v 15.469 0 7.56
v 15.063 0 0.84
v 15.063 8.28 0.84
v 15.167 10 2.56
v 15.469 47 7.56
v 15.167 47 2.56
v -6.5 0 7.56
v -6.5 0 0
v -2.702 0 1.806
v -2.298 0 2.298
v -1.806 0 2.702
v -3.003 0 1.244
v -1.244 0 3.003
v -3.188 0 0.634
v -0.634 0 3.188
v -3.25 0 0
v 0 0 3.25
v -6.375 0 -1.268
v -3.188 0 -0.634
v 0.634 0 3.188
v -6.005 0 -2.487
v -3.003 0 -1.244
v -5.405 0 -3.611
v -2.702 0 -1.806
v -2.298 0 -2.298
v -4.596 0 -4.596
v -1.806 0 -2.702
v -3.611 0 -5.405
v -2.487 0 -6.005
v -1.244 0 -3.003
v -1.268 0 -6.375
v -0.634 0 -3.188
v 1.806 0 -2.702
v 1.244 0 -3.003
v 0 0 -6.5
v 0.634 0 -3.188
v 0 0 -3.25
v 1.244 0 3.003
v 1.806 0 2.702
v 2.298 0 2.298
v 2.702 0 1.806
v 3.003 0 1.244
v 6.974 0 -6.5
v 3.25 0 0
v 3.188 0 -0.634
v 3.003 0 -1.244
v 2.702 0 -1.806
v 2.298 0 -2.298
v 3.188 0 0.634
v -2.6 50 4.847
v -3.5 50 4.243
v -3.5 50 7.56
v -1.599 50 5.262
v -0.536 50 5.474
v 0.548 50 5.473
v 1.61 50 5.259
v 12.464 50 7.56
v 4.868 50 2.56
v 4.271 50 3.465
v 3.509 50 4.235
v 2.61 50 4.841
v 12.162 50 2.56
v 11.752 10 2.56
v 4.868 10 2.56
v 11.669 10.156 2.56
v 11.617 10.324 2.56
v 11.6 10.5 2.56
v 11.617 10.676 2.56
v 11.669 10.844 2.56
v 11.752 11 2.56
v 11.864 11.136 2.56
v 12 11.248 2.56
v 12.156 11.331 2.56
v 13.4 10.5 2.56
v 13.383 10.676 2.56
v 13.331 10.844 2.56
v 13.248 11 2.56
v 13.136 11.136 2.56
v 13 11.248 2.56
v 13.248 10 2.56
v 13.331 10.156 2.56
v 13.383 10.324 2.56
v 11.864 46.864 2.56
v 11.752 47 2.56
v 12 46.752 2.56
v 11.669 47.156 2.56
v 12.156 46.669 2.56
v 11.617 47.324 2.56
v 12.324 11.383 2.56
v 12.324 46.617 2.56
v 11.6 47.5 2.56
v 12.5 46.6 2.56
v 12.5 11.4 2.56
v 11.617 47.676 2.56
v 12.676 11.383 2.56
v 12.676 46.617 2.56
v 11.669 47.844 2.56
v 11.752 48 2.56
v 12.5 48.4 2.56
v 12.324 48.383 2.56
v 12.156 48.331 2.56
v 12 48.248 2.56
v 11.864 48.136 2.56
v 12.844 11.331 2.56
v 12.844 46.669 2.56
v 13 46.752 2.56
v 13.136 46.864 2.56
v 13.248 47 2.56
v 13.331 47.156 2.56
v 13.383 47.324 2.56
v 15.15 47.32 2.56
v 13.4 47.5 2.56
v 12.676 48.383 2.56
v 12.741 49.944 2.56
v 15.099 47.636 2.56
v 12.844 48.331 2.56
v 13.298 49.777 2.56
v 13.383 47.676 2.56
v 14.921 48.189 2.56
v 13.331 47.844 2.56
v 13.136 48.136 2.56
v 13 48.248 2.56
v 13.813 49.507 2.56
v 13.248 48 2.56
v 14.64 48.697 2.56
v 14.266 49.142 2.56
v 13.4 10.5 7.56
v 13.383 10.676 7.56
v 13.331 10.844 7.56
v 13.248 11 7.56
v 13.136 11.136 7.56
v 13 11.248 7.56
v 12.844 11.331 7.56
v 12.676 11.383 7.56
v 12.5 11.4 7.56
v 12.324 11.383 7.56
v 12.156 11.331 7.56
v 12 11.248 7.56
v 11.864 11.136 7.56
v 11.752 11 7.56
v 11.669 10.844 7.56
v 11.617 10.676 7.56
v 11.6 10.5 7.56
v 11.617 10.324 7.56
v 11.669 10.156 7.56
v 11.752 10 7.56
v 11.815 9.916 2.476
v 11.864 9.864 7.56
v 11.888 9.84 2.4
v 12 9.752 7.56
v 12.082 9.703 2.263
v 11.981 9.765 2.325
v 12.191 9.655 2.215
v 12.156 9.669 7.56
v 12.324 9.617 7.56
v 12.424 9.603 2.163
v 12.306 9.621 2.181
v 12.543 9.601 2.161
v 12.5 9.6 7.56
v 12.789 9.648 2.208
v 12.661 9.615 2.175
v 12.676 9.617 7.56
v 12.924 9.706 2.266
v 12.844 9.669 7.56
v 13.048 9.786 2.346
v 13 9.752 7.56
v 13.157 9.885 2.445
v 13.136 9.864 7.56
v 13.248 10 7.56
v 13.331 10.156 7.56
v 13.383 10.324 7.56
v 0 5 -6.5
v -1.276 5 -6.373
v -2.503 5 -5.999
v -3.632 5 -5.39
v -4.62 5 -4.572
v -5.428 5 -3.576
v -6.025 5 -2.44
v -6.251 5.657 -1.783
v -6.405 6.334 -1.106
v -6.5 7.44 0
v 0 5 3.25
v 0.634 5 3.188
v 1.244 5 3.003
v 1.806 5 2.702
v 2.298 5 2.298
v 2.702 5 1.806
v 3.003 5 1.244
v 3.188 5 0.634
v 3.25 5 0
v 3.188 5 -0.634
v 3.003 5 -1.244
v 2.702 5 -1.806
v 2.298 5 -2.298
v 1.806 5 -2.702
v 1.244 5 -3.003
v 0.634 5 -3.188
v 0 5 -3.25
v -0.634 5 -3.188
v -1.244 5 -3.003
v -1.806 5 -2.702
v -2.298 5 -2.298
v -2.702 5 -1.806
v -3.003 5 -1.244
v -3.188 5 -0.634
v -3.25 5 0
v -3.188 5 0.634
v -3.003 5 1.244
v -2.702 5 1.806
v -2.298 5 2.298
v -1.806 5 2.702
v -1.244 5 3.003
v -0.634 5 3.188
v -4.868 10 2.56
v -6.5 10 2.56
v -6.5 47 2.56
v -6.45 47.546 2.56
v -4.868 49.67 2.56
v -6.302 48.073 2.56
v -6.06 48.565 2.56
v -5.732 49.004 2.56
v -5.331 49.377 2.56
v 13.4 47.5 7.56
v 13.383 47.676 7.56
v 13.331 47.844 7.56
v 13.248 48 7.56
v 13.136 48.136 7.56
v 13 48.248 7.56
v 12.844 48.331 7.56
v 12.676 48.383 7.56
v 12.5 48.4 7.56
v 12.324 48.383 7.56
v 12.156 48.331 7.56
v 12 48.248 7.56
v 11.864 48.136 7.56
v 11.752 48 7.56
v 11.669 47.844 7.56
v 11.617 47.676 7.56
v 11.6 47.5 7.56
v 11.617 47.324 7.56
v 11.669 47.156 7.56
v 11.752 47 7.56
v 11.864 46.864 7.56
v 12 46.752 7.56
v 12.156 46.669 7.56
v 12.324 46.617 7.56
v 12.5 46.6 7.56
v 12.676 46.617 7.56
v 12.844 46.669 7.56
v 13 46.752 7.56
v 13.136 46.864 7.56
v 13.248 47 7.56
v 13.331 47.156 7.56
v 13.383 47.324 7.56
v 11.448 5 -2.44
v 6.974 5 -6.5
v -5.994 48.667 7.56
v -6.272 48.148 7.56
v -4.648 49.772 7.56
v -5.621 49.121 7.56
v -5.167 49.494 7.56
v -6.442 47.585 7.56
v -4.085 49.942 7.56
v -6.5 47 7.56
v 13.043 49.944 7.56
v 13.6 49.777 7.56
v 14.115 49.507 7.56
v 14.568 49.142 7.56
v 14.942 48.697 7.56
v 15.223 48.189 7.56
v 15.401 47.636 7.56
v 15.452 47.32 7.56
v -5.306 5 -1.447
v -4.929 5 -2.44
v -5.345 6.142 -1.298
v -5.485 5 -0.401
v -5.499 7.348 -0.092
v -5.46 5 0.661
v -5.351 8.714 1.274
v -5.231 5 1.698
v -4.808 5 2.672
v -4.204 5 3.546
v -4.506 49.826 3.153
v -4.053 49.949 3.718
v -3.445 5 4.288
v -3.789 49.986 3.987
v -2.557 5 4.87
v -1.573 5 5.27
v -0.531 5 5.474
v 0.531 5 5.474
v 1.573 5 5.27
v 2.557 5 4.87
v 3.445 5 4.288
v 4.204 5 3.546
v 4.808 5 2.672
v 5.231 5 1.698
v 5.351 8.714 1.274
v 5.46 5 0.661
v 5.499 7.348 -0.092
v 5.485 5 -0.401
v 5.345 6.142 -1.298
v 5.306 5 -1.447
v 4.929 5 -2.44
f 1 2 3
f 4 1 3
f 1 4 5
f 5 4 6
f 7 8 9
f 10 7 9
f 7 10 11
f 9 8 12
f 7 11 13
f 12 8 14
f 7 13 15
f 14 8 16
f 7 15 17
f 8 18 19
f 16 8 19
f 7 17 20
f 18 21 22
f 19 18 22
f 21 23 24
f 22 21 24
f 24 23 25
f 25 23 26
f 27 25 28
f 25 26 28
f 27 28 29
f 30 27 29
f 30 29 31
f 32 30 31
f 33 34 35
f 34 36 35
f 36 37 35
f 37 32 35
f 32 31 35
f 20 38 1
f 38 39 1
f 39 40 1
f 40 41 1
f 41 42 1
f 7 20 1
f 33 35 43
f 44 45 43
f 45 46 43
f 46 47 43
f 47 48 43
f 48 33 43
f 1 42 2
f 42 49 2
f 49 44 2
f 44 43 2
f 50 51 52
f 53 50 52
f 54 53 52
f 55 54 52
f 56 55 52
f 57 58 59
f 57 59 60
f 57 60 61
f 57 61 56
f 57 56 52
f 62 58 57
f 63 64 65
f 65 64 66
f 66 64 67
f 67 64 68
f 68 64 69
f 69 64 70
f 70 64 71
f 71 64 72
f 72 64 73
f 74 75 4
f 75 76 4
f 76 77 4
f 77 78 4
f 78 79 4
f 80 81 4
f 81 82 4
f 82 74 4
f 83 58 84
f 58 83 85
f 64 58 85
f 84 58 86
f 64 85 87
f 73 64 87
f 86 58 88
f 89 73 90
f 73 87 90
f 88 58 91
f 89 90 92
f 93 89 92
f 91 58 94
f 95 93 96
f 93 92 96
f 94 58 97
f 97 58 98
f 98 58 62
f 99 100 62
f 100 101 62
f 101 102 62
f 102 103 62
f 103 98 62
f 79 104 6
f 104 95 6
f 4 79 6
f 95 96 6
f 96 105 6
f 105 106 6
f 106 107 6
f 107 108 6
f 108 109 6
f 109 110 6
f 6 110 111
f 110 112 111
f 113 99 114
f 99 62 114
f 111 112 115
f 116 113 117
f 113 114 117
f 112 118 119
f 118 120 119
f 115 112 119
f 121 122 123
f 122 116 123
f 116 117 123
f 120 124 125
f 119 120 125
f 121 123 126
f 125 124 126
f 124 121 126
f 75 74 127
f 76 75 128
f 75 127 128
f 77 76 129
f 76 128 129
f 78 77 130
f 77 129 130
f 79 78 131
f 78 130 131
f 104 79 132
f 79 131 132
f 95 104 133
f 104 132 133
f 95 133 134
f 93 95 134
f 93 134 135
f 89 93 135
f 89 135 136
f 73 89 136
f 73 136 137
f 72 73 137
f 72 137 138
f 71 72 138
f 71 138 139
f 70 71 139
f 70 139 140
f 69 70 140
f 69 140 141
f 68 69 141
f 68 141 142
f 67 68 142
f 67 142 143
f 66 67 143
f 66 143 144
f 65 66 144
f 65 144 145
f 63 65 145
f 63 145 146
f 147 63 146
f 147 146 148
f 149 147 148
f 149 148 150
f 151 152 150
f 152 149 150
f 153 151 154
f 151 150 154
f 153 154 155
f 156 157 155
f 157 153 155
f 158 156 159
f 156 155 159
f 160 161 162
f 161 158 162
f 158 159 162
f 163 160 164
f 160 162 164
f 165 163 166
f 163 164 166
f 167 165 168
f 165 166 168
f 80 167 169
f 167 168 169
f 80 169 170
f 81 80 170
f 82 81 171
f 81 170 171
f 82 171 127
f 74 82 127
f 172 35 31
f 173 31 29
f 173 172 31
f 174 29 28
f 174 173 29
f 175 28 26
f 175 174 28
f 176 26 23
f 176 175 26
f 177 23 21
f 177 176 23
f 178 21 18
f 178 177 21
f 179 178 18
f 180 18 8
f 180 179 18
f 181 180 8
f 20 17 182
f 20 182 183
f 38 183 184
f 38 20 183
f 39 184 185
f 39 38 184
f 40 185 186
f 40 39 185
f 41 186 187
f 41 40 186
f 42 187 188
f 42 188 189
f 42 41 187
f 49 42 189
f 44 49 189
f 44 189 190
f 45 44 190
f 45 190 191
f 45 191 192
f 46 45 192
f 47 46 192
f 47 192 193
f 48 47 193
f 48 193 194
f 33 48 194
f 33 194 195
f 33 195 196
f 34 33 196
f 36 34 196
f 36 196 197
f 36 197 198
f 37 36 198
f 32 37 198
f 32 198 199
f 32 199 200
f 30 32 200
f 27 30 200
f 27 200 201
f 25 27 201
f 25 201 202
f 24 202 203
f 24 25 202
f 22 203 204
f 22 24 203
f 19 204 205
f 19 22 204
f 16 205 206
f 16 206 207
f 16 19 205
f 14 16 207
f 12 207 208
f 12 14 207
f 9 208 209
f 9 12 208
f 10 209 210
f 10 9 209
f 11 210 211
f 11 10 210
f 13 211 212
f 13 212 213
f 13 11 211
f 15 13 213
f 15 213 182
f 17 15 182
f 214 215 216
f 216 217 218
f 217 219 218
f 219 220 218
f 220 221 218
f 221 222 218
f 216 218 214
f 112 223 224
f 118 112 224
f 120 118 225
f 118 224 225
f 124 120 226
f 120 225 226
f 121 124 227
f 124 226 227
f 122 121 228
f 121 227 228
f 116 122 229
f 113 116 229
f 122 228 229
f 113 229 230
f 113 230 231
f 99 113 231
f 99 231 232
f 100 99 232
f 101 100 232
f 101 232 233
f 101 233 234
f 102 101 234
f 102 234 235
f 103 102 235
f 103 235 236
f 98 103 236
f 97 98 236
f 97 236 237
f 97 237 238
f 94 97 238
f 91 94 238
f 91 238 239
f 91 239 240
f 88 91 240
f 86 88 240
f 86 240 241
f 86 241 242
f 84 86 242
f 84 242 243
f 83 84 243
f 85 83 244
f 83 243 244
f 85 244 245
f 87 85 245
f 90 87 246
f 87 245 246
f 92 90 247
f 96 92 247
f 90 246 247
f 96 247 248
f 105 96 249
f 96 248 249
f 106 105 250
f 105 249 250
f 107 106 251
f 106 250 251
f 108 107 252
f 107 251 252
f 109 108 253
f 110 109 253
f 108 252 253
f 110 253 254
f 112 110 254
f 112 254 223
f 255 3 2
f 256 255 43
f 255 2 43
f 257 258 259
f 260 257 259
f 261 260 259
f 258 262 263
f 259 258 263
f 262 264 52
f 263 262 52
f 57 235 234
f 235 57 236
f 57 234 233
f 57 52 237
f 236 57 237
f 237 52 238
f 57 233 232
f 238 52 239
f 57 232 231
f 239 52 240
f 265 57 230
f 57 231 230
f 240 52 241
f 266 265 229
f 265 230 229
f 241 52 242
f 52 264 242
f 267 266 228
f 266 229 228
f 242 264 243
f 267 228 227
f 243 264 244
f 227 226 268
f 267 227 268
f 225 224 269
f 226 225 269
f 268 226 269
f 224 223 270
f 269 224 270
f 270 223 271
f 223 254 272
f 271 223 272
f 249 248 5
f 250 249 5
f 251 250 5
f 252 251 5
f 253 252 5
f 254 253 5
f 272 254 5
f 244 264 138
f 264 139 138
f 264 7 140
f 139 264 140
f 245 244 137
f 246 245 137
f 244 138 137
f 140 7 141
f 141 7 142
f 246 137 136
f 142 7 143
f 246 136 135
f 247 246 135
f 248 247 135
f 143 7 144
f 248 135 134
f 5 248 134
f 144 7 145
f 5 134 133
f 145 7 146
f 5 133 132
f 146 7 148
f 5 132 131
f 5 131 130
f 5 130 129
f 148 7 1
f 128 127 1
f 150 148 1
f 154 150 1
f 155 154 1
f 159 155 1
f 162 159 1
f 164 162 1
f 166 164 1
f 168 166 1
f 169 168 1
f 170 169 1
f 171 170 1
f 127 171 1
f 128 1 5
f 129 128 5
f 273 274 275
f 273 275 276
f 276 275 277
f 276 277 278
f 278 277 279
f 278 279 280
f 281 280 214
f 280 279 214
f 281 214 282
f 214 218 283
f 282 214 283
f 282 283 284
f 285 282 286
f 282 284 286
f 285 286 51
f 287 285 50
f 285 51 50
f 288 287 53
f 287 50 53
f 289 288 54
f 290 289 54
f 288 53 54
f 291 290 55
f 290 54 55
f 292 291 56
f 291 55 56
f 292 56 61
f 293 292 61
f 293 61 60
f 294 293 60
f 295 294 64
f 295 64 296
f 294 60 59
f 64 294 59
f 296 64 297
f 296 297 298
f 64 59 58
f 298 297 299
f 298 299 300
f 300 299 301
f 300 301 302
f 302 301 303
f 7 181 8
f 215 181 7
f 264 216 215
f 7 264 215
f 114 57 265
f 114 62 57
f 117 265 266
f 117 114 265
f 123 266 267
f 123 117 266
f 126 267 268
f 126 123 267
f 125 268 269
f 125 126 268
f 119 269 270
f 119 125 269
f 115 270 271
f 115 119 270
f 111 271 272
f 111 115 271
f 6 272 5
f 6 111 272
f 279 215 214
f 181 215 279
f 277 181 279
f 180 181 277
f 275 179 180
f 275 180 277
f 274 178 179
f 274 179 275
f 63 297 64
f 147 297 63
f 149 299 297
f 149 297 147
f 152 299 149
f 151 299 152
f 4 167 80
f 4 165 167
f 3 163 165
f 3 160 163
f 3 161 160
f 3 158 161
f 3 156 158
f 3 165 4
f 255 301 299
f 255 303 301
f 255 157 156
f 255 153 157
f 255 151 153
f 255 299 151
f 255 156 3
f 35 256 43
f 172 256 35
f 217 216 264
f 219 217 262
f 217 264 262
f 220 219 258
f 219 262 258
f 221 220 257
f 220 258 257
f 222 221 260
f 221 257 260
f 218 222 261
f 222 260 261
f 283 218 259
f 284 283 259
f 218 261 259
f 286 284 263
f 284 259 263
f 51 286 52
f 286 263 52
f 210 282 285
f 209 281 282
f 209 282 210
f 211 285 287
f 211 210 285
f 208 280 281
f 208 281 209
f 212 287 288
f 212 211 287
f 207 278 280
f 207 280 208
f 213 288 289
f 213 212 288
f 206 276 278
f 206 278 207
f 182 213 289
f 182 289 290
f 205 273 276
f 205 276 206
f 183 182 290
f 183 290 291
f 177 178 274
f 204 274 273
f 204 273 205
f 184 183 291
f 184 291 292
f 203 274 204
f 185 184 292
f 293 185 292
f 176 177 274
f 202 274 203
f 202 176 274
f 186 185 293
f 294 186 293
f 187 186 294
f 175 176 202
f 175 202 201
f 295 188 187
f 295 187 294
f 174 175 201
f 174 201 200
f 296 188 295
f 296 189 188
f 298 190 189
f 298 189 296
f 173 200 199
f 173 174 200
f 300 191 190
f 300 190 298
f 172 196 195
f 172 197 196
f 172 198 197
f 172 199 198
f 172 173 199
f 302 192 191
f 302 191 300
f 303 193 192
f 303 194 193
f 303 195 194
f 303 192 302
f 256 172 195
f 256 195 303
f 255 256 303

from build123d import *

# Parameters (mm, degrees)
SKETCH1_R               = 3.25
BOSS_EXTRUDE1_DEPTH     = 50
CHAMFER4_SIZE           = 7
CHAMFER4_SIZE2          = 10
SKETCH2_R               = 5.5
CUT_EXTRUDE1_DEPTH      = 45
CUT_EXTRUDE3_DEPTH      = 56.397262251
CUT_EXTRUDE3_DEPTH_BACK = 50
CUT_EXTRUDE4_DEPTH      = 45
CHAMFER5_SIZE           = 5
SKETCH3_R               = 0.9
CUT_EXTRUDE5_DEPTH      = 10
FILLET1_R               = 3


with BuildPart() as part:
    # Sketch1 → Boss-Extrude1 (new body)
    with BuildSketch(Plane(origin=(0, 0, 0), x_dir=(1, 0, 0), z_dir=(0, 1, 0))):
        Polygon((-5.320759509, 8), (-22.469015665, -7.56), (22.469015665, -7.56), (5.320759509, 8), align=None)
        with Locations(Location((0, 0, 0), (0, 0, 270))):
            Circle(SKETCH1_R, mode=Mode.SUBTRACT)
    extrude(amount=BOSS_EXTRUDE1_DEPTH)

    # Chamfer4
    chamfer4_edges = [part.edges().sort_by_distance(p)[0] for p in [
        (22.469015665, 25, 7.56),
    ]]
    chamfer4_side = [part.faces().sort_by_distance(p)[0] for p in [
        (0, 25, 7.56),
    ]]
    chamfer(chamfer4_edges, length=CHAMFER4_SIZE, length2=CHAMFER4_SIZE2, reference=chamfer4_side[0])

    # Sketch2 → Cut-Extrude1 (cut)
    with BuildSketch(Plane(origin=(0, 50, 0), x_dir=(1, 0, 0), z_dir=(0, 1, 0))):
        with Locations(Location((0, 0, 0), (0, 0, 270))):
            Circle(SKETCH2_R)
    extrude(amount=-CUT_EXTRUDE1_DEPTH, mode=Mode.SUBTRACT)

    # Sketch4 → Cut-Extrude3 (cut, two sides: drawn at the far end of the back side and taken through both)
    with BuildSketch(Plane.XZ.offset(-CUT_EXTRUDE3_DEPTH_BACK)):
        with BuildLine():
            Line((-6.5, 0), (-6.5, 8.455296228))
            Line((-6.5, 8.455296228), (-18.092934759, 18.509530088))
            Line((-18.092934759, 18.509530088), (-27.843988074, 13.266508324))
            Line((-27.843988074, 13.266508324), (-26.239796982, -3.957148404))
            Line((-26.239796982, -3.957148404), (-22.051551969, -11.746511534))
            Line((-22.051551969, -11.746511534), (6.44529607, -11.904202977))
            Line((6.44529607, -11.904202977), (12.131507072, -6.5))
            Line((12.131507072, -6.5), (0, -6.5))
            ThreePointArc((0, -6.5), (-4.596194078, -4.596194078), (-6.5, 0))
        make_face()
    extrude(amount=CUT_EXTRUDE3_DEPTH + CUT_EXTRUDE3_DEPTH_BACK, mode=Mode.SUBTRACT)

    # Sketch5 → Cut-Extrude4 (cut)
    with BuildSketch(Plane(origin=(0, 50, 0), x_dir=(1, 0, 0), z_dir=(0, 1, 0))):
        Polygon((0, 0), (4.867894822, -2.56), (20.482845708, -2.56), (8.2569175, 8.380042473), (1.341376292, 8.380042473), (-9.589048862, 8.380042473), (-9.589048862, -2.56), (-4.867894822, -2.56), align=None)
    extrude(amount=-CUT_EXTRUDE4_DEPTH, mode=Mode.SUBTRACT)

    # Chamfer5
    chamfer5_edges = [part.edges().sort_by_distance(p)[0] for p in [
        (10.017520214, 5, 2.56),
        (-5.683947411, 5, 2.56),
    ]]
    chamfer(chamfer5_edges, length=CHAMFER5_SIZE)

    # Sketch3 → Cut-Extrude5 (cut)
    with BuildSketch(Plane.XY.offset(7.56)):
        with Locations((12.5, 47.5)):
            Circle(SKETCH3_R)
        with Locations((12.5, 10.5)):
            Circle(SKETCH3_R)
    extrude(amount=-CUT_EXTRUDE5_DEPTH, mode=Mode.SUBTRACT)

    # Fillet1
    fillet1_edges = [part.edges().sort_by_distance(p)[0] for p in [
        (15.318080635, 50, 5.06),
        (-6.5, 50, 5.06),
    ]]
    fillet(fillet1_edges, radius=FILLET1_R)


solid = part.part
